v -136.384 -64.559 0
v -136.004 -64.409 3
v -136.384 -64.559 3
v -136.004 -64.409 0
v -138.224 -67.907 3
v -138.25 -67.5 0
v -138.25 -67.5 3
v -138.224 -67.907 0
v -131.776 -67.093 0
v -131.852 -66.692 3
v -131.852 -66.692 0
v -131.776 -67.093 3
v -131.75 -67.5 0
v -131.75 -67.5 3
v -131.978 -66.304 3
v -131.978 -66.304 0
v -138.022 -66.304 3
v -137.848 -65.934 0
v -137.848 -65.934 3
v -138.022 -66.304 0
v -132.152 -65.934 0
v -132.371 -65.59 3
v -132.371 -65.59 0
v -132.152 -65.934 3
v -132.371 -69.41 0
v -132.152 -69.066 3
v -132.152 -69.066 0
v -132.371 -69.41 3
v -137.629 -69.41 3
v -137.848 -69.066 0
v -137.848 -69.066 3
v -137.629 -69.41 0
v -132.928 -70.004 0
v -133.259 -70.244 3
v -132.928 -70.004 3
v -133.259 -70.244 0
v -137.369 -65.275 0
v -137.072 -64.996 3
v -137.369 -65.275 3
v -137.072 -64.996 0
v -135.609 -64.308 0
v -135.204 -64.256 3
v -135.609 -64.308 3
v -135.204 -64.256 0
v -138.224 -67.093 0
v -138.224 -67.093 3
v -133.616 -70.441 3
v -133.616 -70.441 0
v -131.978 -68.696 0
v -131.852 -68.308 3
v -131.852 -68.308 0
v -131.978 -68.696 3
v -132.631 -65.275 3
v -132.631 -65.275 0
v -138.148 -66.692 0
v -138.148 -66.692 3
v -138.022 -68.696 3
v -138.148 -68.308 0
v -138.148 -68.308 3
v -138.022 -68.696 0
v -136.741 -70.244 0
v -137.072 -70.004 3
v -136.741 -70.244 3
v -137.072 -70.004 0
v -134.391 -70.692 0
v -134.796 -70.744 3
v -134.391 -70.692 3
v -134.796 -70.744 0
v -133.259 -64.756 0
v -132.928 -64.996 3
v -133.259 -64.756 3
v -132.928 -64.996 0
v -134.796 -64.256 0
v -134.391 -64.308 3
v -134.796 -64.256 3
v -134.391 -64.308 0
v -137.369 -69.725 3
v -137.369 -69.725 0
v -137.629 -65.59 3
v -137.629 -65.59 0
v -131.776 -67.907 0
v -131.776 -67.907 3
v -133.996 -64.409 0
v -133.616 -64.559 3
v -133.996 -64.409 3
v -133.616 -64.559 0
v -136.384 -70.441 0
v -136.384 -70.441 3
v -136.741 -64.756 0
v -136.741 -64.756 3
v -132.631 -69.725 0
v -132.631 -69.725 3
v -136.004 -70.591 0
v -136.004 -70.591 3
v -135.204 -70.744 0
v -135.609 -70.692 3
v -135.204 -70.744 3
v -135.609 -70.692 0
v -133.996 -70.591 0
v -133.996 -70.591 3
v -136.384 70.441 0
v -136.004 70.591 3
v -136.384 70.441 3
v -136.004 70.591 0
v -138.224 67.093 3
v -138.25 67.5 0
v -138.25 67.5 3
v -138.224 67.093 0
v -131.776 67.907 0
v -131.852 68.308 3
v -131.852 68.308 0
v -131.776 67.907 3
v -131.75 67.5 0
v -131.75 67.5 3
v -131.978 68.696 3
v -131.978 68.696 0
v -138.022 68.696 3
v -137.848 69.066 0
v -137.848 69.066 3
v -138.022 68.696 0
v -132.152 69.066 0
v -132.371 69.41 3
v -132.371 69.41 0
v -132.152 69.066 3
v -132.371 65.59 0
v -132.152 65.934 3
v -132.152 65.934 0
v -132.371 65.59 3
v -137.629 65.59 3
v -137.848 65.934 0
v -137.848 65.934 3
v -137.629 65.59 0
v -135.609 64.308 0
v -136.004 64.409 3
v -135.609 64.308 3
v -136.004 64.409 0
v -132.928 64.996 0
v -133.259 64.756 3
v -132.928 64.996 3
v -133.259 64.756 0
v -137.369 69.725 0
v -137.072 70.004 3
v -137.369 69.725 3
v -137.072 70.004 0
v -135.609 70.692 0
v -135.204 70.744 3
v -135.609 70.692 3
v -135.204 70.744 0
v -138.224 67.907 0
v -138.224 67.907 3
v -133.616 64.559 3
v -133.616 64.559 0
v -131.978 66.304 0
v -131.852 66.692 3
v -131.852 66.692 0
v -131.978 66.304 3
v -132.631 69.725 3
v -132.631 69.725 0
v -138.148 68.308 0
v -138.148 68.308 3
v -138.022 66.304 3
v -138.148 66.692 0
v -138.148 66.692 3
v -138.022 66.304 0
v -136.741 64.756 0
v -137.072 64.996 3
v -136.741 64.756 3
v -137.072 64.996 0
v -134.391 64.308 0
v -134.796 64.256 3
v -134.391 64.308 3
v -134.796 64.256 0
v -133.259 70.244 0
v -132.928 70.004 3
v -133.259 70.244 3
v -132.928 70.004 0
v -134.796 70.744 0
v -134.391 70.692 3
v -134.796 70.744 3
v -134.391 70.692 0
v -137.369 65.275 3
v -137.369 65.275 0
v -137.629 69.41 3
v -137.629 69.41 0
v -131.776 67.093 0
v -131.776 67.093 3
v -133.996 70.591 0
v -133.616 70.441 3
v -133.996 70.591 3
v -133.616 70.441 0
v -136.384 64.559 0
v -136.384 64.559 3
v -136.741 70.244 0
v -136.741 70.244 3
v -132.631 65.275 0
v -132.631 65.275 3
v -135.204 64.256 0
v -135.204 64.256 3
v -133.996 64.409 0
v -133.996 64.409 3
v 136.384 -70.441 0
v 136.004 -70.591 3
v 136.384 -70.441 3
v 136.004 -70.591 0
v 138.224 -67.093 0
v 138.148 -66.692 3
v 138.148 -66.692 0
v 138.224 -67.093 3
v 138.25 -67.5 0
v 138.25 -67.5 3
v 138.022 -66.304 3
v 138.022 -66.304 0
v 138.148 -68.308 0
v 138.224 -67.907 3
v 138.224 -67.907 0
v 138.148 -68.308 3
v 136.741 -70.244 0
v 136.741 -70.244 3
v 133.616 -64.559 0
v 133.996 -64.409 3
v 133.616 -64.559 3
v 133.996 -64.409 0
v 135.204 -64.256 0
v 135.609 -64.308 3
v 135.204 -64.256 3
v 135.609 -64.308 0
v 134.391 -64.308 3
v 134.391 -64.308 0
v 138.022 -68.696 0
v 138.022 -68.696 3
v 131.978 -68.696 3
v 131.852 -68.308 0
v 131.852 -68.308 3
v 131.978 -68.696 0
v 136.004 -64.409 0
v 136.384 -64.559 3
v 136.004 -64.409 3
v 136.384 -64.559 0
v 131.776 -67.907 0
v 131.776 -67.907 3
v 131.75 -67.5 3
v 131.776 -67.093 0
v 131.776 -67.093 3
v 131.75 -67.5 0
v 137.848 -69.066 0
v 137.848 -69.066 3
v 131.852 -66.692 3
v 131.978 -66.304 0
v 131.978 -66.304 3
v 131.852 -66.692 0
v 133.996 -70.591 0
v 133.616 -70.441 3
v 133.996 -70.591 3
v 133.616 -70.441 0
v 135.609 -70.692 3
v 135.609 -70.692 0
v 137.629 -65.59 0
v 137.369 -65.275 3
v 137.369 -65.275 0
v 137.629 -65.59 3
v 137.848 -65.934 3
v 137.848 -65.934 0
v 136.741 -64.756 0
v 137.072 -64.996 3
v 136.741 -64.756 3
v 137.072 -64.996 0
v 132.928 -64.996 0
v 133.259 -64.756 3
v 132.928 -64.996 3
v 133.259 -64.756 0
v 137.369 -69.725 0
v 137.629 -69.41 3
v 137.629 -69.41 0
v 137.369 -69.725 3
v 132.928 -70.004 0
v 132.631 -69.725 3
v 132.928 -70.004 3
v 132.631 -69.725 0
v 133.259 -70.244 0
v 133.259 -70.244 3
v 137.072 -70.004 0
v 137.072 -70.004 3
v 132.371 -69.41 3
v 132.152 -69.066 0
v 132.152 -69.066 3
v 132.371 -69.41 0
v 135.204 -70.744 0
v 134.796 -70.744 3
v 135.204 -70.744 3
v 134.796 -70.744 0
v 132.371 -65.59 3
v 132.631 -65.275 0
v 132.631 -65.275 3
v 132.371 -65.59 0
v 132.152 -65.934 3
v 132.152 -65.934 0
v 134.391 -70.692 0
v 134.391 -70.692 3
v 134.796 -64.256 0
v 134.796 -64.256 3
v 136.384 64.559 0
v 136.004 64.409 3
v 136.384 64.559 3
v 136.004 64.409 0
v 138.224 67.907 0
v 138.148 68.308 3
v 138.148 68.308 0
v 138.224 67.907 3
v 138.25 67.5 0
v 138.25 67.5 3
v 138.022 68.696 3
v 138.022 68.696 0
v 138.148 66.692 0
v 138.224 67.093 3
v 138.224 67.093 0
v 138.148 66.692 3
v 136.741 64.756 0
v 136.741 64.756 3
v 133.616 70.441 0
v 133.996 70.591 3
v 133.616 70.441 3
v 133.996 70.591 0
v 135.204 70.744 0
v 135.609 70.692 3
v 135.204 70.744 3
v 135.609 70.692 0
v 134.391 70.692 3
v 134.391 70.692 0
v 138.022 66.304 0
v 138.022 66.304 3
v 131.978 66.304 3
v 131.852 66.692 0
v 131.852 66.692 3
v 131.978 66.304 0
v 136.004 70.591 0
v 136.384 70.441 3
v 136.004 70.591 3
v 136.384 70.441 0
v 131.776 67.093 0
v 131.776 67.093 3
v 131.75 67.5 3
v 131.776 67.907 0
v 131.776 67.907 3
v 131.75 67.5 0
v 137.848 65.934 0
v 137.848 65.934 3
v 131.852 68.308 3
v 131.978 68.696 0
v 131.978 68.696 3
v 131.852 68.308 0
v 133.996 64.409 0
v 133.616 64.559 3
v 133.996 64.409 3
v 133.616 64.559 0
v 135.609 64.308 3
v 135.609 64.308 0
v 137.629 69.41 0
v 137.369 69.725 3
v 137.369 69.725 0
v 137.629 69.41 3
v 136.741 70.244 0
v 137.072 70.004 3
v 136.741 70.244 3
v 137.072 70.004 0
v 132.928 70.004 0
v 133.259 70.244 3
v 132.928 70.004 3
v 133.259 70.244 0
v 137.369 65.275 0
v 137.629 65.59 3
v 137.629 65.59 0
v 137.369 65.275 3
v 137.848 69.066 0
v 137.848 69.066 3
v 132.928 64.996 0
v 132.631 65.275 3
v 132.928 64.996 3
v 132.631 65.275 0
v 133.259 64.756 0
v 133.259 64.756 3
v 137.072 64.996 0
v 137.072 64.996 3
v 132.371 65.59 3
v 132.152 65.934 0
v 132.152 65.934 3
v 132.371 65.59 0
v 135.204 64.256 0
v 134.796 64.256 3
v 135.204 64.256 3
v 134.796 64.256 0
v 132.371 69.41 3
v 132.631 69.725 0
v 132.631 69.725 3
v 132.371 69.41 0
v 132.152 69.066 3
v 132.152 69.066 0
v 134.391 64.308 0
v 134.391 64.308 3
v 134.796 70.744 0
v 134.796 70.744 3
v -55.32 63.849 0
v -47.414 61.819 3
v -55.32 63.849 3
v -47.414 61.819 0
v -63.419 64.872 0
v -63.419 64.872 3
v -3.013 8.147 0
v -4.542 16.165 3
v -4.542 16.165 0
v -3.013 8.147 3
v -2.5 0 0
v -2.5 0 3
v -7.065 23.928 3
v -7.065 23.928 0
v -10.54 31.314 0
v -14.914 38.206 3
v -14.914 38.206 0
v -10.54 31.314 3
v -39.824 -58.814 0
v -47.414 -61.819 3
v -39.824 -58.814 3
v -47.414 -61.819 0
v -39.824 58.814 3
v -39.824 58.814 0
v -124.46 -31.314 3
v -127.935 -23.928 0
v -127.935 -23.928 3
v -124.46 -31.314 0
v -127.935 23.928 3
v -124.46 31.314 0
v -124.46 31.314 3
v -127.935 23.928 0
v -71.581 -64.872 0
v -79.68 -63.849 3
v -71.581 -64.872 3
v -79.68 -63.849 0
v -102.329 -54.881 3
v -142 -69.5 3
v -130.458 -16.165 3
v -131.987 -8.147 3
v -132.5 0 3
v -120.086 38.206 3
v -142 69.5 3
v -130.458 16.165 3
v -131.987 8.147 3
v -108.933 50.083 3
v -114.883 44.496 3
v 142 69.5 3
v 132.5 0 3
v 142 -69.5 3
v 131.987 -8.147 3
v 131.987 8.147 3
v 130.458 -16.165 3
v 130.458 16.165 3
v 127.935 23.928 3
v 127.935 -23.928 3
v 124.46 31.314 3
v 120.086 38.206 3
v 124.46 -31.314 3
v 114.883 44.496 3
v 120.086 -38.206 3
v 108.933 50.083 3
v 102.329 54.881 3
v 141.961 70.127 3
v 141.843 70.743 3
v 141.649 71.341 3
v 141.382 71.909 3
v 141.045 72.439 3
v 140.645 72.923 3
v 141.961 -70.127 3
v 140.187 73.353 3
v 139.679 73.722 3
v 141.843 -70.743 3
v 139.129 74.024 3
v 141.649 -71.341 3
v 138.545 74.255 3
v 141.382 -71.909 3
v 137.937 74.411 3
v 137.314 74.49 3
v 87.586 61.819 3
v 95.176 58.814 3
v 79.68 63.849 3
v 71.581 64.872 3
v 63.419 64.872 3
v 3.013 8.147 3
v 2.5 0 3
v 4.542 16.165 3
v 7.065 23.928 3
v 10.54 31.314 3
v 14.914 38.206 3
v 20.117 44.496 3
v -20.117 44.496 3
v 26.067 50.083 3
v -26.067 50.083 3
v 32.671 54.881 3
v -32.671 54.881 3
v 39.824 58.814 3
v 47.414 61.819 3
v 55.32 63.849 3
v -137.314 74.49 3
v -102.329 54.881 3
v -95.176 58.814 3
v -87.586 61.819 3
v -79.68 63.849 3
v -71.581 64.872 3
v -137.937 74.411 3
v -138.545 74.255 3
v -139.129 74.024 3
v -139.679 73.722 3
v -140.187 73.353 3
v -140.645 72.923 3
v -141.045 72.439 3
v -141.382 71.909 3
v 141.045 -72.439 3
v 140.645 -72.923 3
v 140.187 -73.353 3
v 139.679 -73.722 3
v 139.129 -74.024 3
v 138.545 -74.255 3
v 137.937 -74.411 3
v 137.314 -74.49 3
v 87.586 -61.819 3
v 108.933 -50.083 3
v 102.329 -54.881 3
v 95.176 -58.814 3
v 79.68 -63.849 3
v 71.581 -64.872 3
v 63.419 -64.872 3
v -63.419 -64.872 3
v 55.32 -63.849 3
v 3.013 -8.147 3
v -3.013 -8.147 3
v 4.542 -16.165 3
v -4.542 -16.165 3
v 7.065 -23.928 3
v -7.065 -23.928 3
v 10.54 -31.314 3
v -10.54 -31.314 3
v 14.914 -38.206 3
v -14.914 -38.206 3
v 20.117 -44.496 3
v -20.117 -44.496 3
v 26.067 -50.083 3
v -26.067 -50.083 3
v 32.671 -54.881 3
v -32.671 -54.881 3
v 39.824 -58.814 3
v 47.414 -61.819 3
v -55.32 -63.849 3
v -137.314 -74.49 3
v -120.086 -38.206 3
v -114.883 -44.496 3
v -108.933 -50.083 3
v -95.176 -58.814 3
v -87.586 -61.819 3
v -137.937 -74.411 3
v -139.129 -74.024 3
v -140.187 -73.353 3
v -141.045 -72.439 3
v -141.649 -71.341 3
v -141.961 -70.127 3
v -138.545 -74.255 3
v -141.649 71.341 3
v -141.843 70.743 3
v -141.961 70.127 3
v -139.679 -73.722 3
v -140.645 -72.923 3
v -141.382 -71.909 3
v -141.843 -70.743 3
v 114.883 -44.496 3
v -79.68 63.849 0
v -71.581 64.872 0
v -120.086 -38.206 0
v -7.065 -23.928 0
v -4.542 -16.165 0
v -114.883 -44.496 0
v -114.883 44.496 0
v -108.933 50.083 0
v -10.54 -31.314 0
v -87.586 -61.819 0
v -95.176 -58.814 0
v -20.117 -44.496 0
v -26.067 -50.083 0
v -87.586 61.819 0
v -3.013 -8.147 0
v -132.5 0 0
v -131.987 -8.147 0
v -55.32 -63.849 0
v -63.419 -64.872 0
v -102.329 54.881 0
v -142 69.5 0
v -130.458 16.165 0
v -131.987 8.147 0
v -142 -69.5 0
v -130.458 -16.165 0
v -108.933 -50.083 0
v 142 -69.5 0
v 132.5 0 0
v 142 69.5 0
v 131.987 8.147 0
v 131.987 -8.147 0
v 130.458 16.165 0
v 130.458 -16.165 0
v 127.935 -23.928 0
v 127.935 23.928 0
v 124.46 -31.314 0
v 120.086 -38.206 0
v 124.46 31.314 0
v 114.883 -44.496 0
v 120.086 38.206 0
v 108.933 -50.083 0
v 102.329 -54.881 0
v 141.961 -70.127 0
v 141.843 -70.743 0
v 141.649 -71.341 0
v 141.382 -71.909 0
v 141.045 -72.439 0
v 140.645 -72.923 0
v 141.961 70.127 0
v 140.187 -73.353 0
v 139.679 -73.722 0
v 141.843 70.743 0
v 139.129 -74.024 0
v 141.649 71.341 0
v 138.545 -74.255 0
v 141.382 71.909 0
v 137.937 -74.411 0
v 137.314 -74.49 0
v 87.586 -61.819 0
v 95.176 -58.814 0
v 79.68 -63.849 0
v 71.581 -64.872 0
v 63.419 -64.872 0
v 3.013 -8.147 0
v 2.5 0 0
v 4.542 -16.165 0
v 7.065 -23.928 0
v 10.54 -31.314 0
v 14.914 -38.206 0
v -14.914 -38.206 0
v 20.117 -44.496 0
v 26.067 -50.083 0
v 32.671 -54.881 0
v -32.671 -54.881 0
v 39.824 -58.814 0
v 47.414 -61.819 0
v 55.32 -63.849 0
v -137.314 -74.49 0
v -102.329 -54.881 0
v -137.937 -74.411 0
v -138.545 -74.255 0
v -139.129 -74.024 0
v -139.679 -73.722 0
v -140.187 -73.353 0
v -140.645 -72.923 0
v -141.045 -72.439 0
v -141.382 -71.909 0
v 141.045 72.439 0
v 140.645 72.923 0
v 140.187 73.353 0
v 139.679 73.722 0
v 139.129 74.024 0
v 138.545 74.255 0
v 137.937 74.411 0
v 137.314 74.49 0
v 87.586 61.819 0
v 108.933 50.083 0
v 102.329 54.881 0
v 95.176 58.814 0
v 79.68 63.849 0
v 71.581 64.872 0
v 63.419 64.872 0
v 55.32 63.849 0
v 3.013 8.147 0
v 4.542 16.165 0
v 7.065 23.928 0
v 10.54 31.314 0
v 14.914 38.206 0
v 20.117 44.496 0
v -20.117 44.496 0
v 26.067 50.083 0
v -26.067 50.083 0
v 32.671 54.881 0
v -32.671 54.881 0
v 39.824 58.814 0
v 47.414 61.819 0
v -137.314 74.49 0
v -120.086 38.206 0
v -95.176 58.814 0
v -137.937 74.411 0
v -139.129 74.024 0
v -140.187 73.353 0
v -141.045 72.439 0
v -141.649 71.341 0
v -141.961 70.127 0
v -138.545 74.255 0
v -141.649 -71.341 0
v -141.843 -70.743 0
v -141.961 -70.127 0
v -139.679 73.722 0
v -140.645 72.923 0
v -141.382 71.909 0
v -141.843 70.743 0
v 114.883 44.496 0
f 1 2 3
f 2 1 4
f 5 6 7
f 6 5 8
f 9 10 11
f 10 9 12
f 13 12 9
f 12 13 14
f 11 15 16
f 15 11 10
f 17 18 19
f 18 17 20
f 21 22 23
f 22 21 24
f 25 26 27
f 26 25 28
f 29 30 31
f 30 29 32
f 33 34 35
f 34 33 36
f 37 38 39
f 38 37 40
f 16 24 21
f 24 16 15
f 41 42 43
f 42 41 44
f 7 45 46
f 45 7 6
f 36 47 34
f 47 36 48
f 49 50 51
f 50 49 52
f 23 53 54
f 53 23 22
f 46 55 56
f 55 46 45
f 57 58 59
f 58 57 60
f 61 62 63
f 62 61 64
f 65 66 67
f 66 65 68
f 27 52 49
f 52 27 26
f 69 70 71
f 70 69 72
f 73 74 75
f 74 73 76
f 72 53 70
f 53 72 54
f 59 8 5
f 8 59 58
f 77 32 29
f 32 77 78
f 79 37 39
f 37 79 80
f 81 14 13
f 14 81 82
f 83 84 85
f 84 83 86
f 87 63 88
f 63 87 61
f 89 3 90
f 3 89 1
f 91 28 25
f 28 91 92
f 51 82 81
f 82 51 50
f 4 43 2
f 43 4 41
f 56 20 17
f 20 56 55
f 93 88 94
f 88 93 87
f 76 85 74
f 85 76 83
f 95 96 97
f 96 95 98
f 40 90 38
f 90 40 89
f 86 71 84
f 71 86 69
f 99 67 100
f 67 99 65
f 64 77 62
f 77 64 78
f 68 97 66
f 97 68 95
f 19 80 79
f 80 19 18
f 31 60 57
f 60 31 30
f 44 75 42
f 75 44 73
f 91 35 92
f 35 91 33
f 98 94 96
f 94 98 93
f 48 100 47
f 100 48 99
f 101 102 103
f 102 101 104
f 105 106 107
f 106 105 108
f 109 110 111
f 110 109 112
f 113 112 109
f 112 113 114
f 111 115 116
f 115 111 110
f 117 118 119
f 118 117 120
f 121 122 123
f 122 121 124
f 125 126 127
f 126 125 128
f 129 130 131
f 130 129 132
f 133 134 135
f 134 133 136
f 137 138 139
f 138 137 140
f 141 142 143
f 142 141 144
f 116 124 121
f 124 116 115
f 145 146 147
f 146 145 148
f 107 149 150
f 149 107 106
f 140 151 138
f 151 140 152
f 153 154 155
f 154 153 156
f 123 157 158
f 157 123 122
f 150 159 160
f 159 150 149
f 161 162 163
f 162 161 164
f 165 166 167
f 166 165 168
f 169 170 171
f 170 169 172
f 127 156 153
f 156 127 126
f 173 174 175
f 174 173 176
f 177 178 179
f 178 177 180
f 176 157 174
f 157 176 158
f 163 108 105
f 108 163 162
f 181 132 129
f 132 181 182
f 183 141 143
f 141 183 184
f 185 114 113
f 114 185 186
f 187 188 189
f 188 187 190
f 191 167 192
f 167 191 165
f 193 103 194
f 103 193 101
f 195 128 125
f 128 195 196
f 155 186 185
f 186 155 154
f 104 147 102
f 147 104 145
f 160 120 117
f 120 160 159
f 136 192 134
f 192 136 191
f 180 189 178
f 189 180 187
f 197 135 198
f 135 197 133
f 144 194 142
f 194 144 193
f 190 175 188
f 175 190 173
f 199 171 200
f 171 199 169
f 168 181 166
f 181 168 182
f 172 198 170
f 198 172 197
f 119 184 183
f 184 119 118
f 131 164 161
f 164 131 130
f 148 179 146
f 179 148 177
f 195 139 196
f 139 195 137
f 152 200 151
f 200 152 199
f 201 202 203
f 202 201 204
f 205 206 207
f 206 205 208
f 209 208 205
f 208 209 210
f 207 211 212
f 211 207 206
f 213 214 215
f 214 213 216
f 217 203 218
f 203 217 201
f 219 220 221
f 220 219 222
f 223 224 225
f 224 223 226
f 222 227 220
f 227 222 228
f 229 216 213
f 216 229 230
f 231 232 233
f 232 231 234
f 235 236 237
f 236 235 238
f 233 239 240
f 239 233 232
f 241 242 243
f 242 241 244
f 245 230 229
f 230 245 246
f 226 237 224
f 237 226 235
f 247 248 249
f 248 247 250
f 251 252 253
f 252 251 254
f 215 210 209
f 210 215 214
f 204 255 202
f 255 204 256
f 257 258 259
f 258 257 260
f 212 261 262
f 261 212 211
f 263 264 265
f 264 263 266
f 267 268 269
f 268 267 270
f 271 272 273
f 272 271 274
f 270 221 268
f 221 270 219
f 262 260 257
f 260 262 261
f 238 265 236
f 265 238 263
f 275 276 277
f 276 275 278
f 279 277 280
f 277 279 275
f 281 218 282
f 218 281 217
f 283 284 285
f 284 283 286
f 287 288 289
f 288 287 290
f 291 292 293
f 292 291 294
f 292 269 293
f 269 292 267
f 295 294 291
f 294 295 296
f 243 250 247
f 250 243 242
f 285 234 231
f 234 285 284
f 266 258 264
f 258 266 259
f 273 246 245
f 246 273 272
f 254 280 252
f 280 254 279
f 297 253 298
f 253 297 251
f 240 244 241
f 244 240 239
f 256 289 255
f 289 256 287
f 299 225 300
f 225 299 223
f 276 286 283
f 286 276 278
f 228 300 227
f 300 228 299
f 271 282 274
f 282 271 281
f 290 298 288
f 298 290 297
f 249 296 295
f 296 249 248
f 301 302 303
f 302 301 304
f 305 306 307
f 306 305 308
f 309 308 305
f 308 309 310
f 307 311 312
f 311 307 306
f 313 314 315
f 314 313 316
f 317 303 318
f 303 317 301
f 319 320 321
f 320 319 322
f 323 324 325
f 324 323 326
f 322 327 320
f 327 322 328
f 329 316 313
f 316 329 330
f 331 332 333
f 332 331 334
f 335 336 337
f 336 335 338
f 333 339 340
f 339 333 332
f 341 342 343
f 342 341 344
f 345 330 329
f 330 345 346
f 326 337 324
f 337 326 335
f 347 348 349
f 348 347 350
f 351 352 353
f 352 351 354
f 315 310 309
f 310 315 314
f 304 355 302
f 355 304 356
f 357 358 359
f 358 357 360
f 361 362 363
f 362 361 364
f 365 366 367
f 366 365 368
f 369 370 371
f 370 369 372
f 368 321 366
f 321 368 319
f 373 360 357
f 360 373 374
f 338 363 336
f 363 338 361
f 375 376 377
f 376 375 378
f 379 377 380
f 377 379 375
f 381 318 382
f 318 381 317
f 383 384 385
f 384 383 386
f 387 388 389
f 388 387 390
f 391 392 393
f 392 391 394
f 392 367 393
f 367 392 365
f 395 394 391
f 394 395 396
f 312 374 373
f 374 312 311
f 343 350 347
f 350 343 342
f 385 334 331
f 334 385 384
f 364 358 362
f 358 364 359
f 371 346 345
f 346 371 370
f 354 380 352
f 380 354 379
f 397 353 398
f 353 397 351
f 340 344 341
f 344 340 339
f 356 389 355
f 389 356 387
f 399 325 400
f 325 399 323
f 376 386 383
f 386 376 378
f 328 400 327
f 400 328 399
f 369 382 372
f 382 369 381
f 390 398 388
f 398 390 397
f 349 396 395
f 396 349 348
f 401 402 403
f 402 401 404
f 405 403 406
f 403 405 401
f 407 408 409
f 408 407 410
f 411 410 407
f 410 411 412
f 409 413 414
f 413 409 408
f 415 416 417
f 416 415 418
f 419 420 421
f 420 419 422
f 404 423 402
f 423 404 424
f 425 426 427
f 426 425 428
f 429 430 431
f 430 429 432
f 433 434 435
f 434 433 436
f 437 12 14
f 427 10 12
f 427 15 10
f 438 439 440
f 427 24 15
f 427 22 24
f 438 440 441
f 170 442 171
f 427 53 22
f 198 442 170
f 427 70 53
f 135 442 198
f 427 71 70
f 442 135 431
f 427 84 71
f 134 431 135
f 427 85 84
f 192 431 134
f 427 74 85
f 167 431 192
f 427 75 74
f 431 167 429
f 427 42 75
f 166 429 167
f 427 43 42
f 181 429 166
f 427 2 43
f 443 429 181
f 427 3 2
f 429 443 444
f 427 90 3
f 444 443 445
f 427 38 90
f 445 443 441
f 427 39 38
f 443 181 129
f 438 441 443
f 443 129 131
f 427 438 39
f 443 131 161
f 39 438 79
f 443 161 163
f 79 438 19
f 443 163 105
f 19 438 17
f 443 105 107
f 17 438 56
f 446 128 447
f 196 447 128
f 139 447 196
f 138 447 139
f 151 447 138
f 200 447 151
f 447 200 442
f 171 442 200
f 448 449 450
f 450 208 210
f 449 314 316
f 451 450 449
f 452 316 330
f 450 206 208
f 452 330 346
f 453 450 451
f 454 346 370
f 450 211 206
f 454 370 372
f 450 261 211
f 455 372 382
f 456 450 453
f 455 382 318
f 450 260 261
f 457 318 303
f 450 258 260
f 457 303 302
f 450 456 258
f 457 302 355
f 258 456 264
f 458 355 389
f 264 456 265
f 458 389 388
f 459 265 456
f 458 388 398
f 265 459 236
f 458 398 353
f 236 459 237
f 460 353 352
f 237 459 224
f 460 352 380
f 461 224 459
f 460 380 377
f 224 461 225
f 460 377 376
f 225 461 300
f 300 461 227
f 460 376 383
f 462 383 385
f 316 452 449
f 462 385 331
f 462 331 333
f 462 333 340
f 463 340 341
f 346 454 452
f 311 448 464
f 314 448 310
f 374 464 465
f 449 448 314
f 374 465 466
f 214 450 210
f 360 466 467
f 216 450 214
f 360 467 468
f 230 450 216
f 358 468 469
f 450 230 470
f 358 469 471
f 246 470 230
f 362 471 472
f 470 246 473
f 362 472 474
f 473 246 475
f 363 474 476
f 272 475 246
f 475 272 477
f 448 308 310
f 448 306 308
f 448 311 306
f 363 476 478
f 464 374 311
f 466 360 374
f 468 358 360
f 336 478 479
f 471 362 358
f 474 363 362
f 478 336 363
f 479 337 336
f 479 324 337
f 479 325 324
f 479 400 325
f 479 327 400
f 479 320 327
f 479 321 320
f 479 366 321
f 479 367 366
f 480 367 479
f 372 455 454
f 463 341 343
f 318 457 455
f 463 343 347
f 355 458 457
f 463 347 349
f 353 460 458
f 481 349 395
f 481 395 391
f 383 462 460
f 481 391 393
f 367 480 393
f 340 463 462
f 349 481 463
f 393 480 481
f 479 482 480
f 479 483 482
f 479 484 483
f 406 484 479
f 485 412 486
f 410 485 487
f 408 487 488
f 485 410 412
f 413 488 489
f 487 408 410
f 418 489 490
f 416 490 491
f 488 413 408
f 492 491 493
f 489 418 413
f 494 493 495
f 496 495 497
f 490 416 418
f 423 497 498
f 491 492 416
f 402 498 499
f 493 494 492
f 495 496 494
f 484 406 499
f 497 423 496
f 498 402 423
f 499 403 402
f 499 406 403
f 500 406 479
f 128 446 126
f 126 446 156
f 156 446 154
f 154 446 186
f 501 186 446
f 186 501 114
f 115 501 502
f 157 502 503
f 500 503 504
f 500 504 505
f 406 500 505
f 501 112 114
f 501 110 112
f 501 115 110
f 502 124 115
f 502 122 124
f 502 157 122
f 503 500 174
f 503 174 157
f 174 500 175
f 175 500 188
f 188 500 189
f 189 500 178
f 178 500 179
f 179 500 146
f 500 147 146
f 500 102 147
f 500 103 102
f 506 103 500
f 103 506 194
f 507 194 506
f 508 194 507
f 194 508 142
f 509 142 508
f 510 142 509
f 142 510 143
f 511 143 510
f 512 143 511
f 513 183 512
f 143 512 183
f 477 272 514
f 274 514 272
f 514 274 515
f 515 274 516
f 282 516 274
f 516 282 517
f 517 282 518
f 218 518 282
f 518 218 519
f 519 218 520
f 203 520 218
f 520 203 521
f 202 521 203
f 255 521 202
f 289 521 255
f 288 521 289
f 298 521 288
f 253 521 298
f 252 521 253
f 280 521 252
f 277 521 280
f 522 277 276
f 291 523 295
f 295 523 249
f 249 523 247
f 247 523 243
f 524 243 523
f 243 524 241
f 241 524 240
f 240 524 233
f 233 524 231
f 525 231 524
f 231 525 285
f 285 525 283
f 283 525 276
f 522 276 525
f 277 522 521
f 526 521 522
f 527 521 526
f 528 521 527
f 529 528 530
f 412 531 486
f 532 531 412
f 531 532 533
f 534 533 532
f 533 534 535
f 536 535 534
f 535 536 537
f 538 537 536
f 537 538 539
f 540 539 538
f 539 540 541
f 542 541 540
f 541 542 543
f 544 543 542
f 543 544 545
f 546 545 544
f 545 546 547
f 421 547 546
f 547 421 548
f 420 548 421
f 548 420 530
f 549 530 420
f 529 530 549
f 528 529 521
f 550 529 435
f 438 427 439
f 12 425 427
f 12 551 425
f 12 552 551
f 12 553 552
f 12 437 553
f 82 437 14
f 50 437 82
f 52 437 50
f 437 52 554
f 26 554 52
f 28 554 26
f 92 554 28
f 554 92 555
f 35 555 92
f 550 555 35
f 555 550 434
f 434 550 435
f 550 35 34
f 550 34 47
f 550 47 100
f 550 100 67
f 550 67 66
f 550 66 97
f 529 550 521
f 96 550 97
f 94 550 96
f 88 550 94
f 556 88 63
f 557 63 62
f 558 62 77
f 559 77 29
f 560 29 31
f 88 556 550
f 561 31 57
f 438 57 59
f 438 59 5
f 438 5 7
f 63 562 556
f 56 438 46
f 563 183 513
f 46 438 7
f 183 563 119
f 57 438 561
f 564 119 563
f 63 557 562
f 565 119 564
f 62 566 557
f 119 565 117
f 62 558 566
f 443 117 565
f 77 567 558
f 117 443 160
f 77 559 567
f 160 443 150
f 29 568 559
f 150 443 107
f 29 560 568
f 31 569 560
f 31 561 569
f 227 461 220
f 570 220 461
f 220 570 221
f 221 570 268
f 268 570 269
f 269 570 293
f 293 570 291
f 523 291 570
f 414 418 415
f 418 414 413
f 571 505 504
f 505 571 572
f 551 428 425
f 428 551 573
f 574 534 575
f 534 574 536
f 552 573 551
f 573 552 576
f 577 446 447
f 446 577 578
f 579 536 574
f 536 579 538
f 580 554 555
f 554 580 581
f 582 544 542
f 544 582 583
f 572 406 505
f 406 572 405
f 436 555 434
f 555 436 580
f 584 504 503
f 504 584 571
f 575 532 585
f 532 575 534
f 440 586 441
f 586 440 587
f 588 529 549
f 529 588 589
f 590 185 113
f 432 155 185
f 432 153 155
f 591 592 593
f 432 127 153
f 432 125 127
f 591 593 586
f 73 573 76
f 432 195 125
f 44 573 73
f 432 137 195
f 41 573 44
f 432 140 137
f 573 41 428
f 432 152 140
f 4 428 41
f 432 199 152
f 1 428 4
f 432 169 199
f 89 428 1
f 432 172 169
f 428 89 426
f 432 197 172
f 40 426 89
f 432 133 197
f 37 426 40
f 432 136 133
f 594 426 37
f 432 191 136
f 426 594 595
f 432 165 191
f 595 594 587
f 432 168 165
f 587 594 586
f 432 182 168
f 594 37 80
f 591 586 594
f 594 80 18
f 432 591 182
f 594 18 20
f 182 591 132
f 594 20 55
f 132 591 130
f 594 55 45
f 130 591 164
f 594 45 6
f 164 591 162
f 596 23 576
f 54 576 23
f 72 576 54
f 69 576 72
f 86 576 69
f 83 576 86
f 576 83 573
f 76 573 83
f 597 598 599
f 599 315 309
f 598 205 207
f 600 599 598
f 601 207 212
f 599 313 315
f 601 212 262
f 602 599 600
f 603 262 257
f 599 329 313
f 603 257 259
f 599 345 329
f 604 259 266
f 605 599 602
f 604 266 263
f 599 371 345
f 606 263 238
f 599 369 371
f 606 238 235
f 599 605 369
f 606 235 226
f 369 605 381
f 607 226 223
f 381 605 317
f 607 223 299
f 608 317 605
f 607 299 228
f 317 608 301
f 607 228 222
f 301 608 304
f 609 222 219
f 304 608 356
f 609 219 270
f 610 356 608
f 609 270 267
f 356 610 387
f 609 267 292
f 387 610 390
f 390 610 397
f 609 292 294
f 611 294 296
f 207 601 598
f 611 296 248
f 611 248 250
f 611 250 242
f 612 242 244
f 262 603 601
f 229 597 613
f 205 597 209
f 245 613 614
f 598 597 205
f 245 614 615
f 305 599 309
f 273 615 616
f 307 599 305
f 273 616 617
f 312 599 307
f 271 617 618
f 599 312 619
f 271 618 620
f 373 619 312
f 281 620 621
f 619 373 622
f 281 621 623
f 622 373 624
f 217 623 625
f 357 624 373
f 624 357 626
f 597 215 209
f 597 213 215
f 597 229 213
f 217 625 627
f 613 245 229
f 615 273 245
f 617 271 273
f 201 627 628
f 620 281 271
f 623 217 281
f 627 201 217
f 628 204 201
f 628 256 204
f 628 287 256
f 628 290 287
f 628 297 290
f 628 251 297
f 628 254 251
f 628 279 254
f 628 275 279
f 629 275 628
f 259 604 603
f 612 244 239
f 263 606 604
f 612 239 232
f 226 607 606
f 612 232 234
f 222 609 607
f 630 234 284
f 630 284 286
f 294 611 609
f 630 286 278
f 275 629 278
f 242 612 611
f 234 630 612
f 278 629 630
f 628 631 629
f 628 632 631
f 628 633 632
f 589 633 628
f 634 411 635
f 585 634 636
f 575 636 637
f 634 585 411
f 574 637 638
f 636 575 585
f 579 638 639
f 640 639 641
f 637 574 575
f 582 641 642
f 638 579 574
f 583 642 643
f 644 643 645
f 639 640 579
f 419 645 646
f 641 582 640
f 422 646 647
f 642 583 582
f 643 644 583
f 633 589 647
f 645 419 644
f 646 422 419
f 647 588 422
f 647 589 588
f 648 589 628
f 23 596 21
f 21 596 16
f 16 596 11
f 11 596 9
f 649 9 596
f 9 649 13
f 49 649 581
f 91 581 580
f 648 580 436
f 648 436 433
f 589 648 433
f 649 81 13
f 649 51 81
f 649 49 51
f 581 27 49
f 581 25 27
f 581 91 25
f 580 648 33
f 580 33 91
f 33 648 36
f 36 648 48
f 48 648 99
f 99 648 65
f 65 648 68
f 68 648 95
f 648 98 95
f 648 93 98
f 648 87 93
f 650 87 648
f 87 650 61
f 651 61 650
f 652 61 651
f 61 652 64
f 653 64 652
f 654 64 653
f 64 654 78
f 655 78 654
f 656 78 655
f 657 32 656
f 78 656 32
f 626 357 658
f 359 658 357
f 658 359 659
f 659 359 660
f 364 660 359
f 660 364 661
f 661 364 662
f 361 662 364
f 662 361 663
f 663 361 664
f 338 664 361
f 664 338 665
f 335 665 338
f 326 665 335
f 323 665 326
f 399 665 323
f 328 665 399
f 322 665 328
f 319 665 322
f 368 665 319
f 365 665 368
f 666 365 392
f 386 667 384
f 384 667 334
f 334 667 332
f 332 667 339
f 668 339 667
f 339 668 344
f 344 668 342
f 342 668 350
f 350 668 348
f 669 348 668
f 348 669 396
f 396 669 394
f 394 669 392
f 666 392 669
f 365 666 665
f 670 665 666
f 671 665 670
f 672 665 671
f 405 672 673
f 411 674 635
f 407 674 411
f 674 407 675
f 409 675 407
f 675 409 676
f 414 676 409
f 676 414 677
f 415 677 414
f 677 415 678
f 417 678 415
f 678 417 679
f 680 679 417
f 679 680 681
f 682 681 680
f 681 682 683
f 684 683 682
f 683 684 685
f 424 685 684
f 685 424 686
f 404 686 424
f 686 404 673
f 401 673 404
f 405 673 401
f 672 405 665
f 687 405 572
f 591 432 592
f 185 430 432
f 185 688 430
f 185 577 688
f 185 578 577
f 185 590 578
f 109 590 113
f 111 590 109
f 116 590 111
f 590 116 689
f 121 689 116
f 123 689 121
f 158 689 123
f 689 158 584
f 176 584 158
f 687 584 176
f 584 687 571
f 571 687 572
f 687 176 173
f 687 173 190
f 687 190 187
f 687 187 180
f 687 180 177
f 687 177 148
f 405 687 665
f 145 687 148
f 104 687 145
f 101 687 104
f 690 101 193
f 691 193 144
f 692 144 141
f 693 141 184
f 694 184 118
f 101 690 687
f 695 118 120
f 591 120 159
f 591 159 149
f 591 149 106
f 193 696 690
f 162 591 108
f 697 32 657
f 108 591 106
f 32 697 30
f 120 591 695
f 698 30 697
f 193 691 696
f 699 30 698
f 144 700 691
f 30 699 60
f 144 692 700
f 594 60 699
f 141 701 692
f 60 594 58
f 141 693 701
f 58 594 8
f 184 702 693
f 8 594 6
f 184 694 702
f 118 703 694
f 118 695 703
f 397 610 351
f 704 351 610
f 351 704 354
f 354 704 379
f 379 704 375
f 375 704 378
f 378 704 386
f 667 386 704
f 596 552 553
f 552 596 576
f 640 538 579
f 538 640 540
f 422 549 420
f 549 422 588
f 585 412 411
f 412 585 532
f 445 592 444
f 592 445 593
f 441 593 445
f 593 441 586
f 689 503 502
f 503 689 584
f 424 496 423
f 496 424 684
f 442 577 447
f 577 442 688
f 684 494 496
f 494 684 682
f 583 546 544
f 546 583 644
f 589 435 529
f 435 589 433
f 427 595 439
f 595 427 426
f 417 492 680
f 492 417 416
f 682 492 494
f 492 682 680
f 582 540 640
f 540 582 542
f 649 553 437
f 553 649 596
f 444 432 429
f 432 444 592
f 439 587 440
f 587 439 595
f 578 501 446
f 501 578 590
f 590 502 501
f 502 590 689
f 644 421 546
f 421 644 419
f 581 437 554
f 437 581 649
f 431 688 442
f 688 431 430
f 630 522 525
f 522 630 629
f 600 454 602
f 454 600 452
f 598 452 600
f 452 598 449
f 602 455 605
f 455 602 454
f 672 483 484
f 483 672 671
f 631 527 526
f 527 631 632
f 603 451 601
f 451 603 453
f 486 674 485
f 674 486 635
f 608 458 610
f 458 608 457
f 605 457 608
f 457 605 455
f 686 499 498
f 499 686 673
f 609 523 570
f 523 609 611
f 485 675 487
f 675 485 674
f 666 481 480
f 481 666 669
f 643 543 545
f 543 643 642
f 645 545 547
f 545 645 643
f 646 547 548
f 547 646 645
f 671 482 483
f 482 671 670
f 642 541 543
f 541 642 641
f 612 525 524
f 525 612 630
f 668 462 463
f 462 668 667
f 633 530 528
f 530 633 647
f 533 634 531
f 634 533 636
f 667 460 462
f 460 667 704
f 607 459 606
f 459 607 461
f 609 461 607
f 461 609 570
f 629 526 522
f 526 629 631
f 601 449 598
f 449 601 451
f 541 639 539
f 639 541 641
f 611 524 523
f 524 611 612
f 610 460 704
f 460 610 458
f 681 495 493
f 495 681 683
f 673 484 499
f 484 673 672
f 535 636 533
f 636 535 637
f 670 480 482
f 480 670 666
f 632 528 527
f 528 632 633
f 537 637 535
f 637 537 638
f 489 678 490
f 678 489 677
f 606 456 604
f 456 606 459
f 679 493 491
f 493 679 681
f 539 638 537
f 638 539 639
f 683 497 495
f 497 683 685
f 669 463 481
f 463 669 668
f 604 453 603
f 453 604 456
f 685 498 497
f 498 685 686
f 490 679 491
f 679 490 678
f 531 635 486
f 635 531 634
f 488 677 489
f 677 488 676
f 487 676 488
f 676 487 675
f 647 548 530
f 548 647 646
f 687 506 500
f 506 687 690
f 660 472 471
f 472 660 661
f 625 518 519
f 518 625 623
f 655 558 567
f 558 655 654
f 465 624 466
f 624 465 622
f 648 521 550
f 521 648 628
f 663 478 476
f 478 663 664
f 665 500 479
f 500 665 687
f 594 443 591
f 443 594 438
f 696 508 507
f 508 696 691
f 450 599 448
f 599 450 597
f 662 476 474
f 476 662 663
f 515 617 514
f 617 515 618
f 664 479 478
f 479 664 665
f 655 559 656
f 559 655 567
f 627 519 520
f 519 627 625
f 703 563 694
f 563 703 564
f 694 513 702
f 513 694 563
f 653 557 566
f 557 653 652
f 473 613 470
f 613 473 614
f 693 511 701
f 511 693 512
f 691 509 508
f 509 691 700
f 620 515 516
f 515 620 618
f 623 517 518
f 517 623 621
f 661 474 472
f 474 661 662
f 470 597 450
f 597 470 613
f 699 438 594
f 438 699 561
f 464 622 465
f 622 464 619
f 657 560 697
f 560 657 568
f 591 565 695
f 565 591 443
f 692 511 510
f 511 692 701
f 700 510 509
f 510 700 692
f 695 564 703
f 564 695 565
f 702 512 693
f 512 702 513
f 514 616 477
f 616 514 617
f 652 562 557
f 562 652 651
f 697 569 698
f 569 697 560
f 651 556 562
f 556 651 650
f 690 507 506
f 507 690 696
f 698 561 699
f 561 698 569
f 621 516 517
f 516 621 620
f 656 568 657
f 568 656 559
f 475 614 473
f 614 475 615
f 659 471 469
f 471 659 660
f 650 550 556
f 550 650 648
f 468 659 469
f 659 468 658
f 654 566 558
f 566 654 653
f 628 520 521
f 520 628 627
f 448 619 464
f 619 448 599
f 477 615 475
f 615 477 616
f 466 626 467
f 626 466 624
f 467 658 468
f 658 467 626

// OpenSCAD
$fn = 50;

difference() {
	union() {
		hull() {
			translate(v = [-137.0, 69.5, 0]) {
				cylinder(h = 3, r = 5);
			}
			translate(v = [137.0, 69.5, 0]) {
				cylinder(h = 3, r = 5);
			}
			translate(v = [-137.0, -69.5, 0]) {
				cylinder(h = 3, r = 5);
			}
			translate(v = [137.0, -69.5, 0]) {
				cylinder(h = 3, r = 5);
			}
		}
	}
	union() {
		translate(v = [-135.0, -67.5, -100.0]) {
			cylinder(h = 200, r = 3.25);
		}
		translate(v = [-135.0, 67.5, -100.0]) {
			cylinder(h = 200, r = 3.25);
		}
		translate(v = [135.0, -67.5, -100.0]) {
			cylinder(h = 200, r = 3.25);
		}
		translate(v = [135.0, 67.5, -100.0]) {
			cylinder(h = 200, r = 3.25);
		}
		translate(v = [-135.0, -67.5, -100.0]) {
			cylinder(h = 200, r = 1.8);
		}
		translate(v = [-135.0, 67.5, -100.0]) {
			cylinder(h = 200, r = 1.8);
		}
		translate(v = [135.0, -67.5, -100.0]) {
			cylinder(h = 200, r = 1.8);
		}
		translate(v = [135.0, 67.5, -100.0]) {
			cylinder(h = 200, r = 1.8);
		}
		translate(v = [-67.5, 0, 0.0]) {
			cylinder(h = 3, r = 65.0);
		}
		translate(v = [67.5, 0, 0.0]) {
			cylinder(h = 3, r = 65.0);
		}
	}
}
